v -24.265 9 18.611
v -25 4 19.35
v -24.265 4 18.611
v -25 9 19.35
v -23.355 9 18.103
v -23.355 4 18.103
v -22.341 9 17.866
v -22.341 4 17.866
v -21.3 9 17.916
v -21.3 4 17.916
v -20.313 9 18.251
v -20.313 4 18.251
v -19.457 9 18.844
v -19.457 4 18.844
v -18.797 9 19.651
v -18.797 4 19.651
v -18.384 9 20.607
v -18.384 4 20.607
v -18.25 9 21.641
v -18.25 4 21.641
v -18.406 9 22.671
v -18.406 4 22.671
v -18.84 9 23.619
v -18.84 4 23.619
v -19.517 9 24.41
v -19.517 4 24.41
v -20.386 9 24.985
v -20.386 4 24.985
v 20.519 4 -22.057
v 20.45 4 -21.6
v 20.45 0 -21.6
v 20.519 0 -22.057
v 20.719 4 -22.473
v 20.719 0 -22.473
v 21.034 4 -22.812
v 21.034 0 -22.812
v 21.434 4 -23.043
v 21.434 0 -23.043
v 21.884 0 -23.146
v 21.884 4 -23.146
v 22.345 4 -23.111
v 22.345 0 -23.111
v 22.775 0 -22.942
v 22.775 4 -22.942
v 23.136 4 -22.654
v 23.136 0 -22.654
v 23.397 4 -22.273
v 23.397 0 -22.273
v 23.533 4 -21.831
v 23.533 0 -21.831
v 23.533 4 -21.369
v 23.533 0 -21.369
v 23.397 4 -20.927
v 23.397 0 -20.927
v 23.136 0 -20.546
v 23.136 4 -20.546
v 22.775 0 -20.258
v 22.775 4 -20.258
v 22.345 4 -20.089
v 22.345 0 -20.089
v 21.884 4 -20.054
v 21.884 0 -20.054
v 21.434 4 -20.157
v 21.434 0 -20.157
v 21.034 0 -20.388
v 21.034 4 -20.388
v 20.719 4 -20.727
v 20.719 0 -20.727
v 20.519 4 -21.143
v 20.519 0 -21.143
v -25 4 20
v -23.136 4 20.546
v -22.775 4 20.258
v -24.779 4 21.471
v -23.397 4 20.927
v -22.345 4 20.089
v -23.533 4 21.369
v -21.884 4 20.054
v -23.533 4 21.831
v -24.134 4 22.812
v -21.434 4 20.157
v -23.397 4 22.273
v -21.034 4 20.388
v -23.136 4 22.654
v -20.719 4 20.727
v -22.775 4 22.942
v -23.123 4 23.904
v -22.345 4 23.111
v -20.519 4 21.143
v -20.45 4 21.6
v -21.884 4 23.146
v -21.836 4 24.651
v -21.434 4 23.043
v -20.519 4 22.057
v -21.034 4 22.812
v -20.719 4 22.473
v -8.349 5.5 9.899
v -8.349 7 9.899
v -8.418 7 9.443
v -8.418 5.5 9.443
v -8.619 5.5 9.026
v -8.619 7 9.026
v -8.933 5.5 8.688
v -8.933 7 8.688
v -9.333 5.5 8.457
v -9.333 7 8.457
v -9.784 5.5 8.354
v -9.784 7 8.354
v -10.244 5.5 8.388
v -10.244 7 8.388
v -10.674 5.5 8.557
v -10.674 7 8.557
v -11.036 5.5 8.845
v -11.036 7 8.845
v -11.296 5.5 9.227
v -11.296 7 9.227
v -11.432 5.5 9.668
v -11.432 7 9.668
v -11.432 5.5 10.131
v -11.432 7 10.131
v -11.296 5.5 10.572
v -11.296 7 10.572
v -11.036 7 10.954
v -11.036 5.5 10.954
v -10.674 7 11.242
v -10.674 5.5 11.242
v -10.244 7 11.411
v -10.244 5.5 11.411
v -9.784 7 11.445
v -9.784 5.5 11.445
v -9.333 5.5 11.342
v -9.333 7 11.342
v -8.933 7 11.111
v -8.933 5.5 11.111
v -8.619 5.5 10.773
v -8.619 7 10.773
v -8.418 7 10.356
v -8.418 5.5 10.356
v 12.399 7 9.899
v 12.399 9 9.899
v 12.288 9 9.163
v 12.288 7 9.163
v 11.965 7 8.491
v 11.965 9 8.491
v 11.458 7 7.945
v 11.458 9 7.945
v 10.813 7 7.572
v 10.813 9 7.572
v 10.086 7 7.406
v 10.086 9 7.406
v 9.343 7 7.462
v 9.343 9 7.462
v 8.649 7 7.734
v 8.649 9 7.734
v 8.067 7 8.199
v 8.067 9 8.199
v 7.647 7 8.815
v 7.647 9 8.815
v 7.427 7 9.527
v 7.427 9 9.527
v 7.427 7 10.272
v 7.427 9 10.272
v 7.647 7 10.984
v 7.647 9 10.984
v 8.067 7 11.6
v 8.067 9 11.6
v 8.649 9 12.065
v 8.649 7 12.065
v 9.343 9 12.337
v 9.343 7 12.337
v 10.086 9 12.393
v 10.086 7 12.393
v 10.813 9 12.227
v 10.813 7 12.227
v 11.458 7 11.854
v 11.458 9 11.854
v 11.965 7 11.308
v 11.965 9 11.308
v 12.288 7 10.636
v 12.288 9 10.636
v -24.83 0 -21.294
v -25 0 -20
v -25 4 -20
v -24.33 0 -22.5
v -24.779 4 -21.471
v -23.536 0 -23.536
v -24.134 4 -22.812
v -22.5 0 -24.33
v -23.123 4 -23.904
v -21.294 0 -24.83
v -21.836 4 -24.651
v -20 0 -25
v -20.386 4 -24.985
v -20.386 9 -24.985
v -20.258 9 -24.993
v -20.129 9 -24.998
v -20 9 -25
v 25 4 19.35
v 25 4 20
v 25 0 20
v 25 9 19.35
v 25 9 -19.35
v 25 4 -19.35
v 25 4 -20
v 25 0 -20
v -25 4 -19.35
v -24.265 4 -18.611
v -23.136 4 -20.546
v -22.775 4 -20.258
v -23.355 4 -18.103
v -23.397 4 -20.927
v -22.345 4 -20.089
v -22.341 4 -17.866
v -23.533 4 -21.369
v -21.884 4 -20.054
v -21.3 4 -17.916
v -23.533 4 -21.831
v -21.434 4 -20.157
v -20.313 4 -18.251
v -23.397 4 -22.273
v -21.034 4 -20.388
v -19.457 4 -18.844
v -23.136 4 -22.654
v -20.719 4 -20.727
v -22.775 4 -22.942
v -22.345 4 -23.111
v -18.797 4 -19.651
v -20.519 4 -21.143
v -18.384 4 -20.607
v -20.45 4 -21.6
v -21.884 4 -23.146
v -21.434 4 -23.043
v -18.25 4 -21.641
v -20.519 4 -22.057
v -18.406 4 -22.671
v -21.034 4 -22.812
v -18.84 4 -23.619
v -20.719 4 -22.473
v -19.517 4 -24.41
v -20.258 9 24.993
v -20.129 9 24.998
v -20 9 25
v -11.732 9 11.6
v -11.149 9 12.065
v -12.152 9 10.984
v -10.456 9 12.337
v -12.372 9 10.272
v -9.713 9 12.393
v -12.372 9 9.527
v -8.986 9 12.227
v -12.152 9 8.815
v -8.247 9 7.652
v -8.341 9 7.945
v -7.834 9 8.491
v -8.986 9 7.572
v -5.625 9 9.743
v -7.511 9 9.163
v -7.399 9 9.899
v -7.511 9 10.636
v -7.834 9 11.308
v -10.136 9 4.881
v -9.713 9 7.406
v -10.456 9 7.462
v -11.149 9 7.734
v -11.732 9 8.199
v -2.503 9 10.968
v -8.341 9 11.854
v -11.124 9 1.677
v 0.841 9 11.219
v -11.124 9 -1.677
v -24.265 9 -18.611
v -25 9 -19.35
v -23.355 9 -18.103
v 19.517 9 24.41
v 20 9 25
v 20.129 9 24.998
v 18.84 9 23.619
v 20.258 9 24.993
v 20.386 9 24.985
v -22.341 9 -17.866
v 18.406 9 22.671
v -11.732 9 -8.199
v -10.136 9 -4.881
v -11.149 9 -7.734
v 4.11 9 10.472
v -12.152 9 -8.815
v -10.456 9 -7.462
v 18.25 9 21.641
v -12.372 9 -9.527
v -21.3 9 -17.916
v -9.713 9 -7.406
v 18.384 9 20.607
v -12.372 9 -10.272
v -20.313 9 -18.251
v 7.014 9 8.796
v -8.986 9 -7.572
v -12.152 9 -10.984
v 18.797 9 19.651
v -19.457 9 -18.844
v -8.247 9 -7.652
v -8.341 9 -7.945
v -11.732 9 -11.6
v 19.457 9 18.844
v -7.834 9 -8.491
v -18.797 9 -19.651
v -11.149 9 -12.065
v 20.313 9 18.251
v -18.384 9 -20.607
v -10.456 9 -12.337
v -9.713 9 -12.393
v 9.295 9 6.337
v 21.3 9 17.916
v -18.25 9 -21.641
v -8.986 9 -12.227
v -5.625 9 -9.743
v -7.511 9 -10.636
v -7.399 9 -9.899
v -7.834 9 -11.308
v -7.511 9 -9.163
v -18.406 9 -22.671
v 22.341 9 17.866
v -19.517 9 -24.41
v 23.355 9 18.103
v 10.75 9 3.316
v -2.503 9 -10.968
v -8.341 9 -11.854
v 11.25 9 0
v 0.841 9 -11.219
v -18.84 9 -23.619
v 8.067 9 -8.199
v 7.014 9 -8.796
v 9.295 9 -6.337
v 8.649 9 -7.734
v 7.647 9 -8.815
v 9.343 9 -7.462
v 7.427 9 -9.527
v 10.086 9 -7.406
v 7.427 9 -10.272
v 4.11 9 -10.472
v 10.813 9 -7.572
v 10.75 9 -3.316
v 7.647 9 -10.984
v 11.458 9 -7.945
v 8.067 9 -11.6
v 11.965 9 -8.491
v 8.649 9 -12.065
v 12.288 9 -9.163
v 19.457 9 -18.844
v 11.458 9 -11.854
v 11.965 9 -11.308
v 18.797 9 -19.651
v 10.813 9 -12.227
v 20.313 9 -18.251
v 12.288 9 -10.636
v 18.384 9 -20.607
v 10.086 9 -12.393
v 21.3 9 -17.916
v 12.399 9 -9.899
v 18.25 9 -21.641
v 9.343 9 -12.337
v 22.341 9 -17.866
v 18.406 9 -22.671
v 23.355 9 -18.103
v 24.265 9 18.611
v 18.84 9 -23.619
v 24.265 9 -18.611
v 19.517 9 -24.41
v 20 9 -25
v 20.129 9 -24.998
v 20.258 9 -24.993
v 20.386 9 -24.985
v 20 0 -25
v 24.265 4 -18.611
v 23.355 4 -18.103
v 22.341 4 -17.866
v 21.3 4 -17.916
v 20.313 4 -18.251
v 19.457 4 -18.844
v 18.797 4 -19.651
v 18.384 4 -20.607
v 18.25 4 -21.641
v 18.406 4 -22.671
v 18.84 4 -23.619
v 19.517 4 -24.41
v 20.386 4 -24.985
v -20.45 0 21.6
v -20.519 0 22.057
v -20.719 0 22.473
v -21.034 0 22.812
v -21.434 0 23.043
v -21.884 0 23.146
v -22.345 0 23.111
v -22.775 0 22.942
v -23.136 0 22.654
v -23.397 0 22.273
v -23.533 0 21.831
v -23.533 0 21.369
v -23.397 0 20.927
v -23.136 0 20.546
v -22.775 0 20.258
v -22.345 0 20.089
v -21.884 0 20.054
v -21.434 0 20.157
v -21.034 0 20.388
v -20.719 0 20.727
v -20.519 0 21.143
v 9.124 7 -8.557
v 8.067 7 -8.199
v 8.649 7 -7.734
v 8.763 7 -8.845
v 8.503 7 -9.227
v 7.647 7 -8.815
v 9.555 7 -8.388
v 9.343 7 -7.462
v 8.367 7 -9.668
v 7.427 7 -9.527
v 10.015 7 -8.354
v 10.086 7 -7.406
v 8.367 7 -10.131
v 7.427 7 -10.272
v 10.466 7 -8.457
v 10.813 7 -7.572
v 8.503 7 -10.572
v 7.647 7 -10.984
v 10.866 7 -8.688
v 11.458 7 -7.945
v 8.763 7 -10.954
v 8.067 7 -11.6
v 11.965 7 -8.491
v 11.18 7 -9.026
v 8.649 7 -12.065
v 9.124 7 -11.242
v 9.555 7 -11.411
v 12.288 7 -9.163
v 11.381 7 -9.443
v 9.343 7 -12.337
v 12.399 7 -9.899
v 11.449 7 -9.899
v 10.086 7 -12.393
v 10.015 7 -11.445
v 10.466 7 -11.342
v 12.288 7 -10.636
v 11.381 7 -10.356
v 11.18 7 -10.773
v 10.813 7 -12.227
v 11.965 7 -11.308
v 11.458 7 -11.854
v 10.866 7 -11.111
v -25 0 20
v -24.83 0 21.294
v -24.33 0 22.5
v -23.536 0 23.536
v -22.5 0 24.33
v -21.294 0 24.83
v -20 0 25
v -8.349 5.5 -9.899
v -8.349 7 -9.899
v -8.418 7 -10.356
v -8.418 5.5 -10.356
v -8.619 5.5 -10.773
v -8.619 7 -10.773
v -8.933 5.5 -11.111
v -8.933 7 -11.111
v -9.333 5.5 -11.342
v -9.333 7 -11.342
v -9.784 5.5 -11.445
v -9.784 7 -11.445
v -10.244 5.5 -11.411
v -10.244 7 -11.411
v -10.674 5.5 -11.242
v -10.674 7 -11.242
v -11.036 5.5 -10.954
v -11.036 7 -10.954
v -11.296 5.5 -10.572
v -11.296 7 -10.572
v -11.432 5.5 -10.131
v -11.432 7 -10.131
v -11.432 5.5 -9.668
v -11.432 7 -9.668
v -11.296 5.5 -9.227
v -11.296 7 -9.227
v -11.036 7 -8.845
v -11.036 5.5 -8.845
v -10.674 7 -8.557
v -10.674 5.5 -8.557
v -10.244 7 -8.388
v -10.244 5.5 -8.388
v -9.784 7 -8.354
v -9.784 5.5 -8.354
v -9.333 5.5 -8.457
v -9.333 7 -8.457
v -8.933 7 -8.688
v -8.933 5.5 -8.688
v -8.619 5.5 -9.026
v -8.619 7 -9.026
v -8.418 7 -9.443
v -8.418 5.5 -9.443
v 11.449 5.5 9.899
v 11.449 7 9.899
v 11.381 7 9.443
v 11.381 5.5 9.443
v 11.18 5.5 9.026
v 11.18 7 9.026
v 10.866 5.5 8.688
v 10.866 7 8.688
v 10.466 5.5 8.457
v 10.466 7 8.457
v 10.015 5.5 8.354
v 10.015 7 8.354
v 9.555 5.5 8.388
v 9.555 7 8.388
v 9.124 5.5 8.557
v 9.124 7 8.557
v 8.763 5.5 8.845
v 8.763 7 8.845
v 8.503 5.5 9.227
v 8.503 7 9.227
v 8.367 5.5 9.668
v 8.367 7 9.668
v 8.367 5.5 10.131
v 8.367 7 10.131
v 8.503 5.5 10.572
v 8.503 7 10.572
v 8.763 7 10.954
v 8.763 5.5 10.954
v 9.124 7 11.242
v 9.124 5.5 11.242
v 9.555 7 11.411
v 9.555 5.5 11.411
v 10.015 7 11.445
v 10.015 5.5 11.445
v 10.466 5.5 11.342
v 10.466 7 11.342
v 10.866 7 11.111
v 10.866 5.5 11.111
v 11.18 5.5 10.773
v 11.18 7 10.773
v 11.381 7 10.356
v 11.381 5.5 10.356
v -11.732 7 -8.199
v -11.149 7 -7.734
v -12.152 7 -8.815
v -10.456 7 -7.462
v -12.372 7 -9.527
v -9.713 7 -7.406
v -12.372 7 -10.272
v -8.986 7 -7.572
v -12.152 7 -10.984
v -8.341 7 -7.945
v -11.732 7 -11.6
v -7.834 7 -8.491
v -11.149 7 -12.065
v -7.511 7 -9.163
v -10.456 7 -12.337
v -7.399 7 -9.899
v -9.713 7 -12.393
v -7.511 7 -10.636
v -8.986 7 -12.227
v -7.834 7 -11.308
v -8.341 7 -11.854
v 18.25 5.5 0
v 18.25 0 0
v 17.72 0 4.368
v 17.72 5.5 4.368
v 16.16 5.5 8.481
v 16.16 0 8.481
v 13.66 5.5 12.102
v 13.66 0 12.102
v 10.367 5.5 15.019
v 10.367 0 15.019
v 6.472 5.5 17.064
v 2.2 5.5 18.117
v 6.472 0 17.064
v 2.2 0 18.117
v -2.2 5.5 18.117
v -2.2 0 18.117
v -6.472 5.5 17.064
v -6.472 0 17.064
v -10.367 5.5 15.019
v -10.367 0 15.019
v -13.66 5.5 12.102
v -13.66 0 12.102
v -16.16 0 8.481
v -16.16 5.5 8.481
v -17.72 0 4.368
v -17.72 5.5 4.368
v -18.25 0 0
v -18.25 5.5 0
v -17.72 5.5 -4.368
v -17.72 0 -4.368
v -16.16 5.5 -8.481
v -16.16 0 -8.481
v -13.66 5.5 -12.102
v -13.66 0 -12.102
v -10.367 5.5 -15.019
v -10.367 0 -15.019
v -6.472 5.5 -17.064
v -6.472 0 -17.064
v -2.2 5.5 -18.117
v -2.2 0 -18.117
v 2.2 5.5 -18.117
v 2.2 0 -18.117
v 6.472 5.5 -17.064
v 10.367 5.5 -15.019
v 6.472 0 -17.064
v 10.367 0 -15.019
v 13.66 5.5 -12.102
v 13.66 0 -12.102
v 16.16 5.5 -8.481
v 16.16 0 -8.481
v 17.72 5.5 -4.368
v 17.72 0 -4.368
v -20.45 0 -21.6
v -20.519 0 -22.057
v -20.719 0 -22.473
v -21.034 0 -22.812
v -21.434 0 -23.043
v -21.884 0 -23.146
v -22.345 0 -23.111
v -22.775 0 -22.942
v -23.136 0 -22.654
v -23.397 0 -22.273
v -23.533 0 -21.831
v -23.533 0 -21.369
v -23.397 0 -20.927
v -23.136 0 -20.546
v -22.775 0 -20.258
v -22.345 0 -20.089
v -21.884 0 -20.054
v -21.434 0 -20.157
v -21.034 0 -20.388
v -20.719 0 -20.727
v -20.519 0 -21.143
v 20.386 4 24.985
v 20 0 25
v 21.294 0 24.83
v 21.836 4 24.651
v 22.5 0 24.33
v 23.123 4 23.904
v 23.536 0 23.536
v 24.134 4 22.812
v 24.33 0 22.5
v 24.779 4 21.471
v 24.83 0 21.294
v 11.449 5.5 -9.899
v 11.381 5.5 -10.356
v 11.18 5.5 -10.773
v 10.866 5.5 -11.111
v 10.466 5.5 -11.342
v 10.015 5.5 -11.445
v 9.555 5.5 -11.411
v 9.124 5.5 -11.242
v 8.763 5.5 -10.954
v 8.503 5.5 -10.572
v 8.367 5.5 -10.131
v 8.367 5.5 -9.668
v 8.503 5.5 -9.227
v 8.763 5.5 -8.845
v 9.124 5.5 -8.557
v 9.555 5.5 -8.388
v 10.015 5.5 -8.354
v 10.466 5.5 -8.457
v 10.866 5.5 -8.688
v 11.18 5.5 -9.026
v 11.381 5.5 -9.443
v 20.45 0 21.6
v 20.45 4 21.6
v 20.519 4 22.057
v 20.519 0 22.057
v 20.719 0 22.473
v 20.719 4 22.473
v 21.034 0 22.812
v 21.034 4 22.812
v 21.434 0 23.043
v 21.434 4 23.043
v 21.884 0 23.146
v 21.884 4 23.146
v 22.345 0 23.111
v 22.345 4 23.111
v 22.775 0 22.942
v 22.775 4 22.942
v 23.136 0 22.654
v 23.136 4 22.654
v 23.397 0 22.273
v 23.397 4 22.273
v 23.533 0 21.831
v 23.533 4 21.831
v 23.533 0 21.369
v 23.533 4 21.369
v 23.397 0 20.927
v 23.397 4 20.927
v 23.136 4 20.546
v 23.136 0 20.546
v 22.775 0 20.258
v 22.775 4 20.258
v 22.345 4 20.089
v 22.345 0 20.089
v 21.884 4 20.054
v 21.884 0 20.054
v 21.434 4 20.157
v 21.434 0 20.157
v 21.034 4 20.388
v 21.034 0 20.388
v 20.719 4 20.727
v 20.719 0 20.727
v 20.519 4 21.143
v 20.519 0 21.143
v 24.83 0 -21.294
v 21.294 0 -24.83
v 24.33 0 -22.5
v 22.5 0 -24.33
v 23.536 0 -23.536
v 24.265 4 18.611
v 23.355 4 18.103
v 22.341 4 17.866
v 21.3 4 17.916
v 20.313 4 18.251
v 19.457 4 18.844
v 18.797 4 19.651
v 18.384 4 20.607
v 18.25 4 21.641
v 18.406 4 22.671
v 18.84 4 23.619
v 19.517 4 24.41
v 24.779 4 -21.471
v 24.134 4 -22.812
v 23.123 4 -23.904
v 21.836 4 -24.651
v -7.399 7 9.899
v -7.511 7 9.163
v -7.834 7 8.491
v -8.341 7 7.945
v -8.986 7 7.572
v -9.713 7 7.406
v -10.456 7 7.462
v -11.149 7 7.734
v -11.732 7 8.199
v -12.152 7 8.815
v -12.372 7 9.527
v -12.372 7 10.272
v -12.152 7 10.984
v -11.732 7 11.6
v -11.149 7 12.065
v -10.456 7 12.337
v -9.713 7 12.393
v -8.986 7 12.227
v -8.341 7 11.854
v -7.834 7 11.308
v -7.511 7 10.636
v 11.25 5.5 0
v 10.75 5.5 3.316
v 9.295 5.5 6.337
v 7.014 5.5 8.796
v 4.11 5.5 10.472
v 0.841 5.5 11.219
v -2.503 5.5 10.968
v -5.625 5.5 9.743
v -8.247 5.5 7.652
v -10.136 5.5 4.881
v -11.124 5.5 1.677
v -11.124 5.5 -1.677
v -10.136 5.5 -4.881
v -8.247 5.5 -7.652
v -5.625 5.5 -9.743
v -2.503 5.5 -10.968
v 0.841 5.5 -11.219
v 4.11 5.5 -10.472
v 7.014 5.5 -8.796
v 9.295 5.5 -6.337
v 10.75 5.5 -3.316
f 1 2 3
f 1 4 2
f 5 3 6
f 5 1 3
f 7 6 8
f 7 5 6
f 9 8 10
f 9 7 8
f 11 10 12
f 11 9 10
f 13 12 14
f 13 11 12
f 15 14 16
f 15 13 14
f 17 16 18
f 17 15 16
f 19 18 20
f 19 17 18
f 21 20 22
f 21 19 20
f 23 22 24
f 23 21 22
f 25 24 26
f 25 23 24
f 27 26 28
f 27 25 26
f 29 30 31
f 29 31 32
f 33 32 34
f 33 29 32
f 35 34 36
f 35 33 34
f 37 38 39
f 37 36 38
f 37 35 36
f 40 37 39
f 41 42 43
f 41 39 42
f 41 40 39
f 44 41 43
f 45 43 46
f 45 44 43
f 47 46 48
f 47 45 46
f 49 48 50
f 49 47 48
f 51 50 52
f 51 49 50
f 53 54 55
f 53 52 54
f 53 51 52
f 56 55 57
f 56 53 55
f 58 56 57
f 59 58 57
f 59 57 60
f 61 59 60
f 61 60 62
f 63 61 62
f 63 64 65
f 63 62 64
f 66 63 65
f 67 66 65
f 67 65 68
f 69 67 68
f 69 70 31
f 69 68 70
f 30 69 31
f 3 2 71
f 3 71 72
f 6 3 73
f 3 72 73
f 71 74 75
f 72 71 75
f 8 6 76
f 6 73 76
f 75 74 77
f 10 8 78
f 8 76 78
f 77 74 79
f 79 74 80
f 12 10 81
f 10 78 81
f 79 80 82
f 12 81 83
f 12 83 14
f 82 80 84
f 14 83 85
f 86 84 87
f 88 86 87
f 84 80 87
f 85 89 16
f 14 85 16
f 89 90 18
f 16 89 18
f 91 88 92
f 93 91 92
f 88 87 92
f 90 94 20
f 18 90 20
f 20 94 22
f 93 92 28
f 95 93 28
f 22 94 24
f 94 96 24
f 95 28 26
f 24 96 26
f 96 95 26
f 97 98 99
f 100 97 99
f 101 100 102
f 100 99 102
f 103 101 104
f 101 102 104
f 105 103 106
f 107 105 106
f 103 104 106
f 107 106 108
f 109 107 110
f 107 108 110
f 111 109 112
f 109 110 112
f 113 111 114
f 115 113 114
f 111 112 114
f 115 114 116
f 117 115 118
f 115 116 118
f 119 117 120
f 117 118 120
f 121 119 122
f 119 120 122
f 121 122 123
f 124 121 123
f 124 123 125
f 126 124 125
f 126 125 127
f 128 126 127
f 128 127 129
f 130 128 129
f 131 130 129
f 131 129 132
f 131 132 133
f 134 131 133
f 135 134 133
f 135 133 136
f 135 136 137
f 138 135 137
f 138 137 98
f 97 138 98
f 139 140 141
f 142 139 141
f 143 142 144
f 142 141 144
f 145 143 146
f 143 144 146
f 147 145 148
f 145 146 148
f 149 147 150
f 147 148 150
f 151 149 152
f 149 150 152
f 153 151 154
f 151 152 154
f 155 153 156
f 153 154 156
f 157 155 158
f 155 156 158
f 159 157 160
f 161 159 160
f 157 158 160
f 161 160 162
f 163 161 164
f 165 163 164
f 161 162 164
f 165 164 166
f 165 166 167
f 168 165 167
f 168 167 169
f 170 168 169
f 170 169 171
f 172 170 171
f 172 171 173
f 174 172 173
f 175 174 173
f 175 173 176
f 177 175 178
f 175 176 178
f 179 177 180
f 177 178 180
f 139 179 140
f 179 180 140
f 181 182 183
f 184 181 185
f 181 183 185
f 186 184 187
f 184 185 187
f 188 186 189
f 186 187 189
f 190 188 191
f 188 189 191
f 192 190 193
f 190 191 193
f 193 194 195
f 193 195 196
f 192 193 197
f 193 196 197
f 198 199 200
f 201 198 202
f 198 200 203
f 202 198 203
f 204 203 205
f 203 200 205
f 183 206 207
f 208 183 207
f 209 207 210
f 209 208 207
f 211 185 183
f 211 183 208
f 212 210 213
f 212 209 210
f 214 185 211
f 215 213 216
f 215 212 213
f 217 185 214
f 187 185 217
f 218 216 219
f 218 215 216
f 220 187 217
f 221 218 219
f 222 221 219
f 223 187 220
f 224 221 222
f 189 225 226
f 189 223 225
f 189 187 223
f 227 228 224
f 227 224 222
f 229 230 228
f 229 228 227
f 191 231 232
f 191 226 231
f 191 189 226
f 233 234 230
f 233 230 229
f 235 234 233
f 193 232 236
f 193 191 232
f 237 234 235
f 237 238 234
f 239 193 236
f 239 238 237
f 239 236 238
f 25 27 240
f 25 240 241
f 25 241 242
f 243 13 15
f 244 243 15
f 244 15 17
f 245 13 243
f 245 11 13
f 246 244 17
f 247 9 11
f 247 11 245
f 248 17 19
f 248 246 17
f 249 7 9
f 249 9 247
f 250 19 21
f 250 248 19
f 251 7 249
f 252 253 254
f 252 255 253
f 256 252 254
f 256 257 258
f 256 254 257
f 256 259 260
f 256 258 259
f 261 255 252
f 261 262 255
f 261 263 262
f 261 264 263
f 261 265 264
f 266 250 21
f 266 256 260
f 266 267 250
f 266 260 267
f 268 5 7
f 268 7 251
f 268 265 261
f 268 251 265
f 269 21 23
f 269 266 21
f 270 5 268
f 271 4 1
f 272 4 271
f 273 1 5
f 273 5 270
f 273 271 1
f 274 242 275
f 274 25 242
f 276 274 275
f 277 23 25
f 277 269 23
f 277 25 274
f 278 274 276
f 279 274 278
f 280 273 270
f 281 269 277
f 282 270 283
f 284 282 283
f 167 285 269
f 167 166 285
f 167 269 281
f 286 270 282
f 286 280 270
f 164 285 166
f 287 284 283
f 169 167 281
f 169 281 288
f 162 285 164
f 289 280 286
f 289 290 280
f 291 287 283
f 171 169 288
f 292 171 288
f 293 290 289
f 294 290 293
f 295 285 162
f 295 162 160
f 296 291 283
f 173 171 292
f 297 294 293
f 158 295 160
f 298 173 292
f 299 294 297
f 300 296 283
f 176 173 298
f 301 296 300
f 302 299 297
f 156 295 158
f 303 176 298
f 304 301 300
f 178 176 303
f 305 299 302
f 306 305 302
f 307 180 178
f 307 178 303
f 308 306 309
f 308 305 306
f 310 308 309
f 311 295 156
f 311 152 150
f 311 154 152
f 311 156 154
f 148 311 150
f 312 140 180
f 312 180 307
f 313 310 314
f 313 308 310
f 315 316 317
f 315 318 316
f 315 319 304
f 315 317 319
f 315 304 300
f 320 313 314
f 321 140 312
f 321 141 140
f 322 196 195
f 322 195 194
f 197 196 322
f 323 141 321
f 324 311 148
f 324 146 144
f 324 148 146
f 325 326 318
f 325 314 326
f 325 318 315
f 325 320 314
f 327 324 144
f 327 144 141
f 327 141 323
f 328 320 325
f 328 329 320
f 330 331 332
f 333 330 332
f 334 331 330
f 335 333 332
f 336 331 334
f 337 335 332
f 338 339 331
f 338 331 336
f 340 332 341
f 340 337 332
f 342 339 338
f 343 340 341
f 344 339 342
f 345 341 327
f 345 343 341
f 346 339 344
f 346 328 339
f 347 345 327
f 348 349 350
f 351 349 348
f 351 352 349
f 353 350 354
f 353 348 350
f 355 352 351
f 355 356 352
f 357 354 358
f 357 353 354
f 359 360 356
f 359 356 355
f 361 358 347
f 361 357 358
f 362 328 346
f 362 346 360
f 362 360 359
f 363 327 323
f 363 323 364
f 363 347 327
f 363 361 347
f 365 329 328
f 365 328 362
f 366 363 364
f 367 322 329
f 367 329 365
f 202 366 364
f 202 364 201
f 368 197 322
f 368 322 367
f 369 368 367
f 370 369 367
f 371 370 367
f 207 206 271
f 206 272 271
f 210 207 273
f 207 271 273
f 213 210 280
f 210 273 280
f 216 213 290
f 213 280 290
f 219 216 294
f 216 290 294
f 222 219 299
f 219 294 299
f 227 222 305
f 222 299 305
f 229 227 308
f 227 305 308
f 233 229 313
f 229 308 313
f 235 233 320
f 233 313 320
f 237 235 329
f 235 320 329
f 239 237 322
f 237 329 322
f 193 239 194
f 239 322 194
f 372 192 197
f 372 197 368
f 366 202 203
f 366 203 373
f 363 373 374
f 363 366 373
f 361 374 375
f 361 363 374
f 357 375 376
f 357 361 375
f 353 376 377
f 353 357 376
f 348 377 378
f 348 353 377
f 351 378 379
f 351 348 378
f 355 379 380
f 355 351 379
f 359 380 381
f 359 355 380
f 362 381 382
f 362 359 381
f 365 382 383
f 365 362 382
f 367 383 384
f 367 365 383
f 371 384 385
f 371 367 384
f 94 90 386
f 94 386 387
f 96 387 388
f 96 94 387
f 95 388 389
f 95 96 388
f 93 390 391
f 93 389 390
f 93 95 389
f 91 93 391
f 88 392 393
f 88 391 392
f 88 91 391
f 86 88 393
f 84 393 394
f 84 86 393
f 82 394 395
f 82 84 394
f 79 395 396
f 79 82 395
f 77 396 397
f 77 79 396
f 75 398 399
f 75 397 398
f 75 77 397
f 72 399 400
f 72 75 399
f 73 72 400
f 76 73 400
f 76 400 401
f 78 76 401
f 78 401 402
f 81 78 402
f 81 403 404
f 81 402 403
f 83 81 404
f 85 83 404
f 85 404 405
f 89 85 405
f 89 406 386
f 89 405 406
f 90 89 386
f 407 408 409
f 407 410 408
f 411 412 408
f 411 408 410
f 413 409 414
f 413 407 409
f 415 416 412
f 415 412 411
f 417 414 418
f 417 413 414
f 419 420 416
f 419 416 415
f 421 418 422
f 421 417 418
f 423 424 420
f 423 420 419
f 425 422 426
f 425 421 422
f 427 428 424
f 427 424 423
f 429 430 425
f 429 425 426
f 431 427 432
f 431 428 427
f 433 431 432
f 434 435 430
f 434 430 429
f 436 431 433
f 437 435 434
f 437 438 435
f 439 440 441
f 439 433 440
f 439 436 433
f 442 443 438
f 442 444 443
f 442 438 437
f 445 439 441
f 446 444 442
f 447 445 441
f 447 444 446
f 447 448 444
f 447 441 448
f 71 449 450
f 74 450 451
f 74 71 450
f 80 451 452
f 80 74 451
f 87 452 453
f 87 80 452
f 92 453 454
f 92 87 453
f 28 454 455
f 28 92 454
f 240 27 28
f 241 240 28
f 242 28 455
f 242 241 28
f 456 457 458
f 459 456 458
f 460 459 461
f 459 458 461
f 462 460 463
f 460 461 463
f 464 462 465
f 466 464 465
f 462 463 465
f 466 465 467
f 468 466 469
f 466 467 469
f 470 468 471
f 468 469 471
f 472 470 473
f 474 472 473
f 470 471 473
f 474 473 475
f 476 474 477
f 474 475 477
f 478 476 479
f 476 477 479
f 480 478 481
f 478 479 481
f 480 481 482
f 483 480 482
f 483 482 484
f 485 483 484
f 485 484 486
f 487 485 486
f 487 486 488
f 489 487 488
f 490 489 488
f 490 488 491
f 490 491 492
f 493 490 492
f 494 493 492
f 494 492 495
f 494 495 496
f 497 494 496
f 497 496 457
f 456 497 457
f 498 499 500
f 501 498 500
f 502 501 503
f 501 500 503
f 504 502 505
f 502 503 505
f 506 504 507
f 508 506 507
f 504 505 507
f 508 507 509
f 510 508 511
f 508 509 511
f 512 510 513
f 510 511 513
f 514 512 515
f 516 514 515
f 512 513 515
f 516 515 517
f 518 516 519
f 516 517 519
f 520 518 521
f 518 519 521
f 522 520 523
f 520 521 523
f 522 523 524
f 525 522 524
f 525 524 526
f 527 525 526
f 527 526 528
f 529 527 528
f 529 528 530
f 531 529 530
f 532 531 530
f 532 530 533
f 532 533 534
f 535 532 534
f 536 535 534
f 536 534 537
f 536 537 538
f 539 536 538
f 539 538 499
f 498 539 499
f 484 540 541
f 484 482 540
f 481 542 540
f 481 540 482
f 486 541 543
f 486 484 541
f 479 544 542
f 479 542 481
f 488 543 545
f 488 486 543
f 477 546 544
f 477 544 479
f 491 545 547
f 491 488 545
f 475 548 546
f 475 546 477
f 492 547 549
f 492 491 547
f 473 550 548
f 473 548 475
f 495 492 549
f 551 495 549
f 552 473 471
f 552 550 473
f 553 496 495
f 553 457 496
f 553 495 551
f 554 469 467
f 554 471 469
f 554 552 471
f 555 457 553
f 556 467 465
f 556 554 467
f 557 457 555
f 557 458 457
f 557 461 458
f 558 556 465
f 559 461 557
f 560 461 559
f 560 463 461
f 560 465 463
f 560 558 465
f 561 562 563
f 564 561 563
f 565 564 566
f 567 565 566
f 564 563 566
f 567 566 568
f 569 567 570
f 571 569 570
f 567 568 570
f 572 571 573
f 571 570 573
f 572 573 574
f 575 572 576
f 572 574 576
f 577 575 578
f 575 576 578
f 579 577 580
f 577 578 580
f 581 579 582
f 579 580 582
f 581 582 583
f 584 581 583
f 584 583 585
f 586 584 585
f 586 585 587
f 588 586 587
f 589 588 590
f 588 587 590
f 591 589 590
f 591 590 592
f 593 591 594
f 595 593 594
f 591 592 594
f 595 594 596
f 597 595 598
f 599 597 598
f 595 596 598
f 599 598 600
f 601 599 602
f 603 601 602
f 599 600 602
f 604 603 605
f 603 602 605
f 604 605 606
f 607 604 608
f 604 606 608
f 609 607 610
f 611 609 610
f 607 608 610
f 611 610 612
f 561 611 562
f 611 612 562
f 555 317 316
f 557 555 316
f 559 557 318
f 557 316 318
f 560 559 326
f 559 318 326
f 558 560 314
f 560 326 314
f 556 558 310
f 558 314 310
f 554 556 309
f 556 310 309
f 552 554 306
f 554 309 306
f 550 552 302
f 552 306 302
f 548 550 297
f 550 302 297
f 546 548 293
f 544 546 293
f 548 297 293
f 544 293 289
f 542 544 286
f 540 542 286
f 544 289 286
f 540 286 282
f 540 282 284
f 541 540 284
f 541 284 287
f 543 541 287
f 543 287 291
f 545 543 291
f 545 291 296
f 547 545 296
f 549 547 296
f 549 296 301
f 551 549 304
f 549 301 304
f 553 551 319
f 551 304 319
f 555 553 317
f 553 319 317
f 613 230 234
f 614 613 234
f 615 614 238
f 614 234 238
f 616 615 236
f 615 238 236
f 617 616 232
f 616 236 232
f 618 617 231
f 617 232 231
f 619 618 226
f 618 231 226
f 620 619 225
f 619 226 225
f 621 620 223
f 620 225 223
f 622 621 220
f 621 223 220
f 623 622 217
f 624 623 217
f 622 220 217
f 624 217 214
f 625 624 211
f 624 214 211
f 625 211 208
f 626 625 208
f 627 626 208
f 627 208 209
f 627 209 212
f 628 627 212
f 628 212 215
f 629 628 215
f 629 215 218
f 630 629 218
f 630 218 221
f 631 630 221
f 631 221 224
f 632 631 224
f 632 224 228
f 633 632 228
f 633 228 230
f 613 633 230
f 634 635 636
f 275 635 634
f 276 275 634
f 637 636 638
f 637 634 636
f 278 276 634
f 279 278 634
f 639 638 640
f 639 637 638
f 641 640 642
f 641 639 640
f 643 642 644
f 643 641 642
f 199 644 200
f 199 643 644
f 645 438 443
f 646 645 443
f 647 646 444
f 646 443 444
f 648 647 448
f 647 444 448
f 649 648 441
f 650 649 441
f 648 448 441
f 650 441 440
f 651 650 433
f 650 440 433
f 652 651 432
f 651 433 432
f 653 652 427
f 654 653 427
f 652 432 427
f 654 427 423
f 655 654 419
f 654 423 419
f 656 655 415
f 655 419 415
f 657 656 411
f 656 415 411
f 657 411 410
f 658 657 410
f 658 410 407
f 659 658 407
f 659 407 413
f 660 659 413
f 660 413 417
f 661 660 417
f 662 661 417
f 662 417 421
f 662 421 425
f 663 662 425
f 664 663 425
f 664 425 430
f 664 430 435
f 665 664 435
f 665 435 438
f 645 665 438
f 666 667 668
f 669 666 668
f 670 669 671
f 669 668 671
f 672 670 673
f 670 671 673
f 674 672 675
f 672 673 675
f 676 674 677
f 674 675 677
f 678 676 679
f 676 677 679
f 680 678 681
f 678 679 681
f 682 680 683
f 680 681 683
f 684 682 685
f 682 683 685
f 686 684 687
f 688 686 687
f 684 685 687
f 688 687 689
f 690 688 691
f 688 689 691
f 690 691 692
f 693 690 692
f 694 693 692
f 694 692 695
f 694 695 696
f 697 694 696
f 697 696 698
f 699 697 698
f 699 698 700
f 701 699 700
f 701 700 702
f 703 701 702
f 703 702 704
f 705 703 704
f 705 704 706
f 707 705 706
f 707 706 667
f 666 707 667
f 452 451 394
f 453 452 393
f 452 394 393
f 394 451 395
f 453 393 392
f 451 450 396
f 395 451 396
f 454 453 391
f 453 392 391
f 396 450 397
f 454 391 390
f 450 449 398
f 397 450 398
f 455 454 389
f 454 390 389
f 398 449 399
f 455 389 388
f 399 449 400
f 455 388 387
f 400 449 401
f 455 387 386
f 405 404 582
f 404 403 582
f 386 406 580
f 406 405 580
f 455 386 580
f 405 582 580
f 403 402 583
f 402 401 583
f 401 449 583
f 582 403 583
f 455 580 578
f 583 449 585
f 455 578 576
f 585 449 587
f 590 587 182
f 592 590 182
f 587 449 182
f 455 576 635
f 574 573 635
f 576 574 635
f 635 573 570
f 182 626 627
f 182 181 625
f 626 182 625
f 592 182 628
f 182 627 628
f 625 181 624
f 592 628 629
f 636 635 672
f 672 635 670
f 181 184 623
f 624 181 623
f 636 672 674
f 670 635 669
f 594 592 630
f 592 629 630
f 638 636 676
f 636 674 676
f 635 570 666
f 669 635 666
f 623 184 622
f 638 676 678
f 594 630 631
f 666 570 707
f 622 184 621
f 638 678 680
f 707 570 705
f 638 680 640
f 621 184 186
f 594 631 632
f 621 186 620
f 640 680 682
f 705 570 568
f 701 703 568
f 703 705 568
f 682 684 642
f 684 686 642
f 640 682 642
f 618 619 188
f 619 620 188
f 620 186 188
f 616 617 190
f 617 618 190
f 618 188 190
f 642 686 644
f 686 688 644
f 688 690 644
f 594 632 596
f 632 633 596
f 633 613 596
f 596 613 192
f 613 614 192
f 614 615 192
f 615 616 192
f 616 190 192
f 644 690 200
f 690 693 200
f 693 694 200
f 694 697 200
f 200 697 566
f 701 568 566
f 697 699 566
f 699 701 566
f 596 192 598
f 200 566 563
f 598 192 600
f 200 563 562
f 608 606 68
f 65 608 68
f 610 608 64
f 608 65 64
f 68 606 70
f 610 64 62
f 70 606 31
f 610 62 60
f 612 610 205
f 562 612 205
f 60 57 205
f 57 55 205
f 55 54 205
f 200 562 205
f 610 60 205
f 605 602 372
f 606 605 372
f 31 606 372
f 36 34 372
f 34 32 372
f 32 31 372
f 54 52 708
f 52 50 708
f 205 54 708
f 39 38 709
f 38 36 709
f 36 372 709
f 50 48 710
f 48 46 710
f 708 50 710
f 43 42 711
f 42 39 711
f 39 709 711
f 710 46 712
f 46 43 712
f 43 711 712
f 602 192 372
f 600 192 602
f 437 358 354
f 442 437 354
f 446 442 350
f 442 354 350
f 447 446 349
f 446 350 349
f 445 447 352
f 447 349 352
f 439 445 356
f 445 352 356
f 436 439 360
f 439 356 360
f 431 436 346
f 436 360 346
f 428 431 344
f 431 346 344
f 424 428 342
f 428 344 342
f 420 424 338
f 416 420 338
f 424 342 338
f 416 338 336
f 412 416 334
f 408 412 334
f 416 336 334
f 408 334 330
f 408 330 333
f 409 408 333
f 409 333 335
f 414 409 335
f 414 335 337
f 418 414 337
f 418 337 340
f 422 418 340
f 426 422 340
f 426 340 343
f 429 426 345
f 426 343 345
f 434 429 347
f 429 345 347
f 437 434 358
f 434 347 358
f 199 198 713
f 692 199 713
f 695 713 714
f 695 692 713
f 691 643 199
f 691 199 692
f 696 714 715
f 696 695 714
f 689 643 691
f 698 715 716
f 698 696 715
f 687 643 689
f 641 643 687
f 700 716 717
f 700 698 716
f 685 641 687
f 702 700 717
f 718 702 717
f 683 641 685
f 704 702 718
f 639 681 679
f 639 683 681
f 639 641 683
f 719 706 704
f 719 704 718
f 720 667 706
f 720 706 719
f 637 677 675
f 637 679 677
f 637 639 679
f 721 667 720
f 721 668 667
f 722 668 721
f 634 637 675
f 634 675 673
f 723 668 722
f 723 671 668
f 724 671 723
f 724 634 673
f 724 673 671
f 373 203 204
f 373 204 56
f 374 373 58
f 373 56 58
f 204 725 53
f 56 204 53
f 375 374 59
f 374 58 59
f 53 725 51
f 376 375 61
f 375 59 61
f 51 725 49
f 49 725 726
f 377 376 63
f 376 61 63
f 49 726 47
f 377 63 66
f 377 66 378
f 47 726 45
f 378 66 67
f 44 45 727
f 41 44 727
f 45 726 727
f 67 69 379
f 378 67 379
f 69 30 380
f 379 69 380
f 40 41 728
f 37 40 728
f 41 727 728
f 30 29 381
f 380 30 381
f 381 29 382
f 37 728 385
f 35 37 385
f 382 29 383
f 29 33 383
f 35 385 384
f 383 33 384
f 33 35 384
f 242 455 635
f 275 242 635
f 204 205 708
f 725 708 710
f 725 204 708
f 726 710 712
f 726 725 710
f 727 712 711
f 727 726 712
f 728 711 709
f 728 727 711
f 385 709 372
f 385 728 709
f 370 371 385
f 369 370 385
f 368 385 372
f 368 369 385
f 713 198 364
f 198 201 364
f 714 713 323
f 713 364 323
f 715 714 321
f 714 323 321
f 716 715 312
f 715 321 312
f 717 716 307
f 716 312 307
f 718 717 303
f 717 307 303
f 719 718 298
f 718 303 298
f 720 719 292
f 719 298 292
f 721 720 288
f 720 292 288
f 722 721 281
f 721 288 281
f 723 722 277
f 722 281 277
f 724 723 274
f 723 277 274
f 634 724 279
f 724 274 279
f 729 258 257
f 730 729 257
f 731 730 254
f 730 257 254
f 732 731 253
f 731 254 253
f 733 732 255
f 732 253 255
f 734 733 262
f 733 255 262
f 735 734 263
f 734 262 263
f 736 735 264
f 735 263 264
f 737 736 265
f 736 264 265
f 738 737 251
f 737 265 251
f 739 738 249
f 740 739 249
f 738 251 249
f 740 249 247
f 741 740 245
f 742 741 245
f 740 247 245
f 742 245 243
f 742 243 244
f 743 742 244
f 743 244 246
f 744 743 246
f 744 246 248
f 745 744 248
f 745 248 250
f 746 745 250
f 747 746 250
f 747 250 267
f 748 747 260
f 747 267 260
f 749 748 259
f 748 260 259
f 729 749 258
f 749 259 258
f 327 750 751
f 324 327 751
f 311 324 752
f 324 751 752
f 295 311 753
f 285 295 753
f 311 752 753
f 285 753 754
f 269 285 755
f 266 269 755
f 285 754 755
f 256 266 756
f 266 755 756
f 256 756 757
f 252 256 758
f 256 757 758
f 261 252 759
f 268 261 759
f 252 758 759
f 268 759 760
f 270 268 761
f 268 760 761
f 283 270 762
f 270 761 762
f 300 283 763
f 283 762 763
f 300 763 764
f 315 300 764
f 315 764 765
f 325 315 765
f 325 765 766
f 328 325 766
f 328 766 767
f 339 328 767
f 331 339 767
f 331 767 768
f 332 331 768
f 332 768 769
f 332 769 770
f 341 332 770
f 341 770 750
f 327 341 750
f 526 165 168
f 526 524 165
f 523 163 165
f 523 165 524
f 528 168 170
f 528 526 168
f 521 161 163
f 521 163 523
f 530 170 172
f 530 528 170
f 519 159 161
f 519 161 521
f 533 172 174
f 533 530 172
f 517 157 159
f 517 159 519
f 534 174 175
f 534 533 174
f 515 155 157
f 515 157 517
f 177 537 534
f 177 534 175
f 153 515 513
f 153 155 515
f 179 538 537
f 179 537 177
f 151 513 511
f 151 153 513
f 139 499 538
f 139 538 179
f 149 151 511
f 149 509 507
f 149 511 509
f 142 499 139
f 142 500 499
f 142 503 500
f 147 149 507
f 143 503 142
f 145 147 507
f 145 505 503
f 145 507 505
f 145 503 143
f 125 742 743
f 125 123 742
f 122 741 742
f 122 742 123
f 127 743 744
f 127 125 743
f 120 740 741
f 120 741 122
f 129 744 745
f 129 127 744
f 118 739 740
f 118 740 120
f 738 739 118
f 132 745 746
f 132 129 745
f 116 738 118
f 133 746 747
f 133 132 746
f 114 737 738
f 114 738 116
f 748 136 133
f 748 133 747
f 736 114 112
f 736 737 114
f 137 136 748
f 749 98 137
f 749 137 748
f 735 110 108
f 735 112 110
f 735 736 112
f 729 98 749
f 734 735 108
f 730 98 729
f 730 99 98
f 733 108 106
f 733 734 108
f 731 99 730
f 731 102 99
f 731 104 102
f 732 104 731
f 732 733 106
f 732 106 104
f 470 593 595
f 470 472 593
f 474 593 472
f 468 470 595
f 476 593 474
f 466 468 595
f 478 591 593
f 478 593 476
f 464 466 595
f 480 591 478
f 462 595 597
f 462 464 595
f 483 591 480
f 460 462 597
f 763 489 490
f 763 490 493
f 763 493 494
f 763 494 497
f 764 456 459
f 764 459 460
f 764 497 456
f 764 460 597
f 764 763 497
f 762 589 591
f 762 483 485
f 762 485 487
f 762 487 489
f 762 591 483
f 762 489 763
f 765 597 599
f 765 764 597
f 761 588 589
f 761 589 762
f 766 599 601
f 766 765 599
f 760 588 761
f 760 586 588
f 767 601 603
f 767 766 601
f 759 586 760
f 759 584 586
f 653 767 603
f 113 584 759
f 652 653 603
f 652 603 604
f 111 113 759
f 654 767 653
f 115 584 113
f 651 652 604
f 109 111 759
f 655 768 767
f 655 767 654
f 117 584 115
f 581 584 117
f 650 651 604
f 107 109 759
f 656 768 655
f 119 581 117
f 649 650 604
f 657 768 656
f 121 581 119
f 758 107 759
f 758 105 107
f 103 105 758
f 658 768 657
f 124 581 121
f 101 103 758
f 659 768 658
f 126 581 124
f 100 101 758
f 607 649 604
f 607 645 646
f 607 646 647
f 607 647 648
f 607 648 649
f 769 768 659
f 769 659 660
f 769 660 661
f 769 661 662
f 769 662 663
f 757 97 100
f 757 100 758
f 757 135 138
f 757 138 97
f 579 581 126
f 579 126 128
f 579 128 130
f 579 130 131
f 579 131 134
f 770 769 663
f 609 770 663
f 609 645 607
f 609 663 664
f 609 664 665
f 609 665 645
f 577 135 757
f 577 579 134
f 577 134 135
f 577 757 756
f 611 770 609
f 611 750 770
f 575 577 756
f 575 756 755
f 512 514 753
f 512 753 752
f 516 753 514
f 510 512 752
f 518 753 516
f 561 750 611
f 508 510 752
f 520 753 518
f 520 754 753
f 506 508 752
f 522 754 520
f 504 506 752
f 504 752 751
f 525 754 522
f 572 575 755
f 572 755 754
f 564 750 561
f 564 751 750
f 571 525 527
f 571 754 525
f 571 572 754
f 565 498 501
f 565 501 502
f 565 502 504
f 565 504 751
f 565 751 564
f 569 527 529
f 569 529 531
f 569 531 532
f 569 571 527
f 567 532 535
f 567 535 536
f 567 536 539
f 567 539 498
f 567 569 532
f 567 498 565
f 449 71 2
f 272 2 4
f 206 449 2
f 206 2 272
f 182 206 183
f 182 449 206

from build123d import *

# Parameters (mm, degrees)
SKETCH1_W               = 50
SKETCH1_H               = 50
BOSS_EXTRUDE1_DEPTH     = 12
FILLET1_R               = 5
SKETCH3_R               = 18.25
CUT_EXTRUDE1_DEPTH      = 5.5
SKETCH4_R               = 11.25
CUT_EXTRUDE2_DEPTH      = 10
SKETCH5_W               = 62.97921445
SKETCH5_H               = 70.453436458
CUT_EXTRUDE3_DEPTH      = 3
SKETCH6_R               = 2.5
CUT_EXTRUDE4_DEPTH      = 2
SKETCH7_R               = 1.55
CUT_EXTRUDE5_DEPTH      = 3
SKETCH8_R               = 1.55
CUT_EXTRUDE6_DEPTH      = 12
SKETCH9_R               = 3.75
CUT_EXTRUDE7_DEPTH      = 5
MIRROR2_COPY_1_SKETCH_R = 1.55
MIRROR2_COPY_1_DEPTH    = 12
MIRROR2_COPY_2_SKETCH_R = 3.75
MIRROR2_COPY_2_DEPTH    = 5


with BuildPart() as part:
    # Sketch1 → Boss-Extrude1 (new body)
    with BuildSketch(Plane(origin=(0, 0, 0), x_dir=(1, 0, 0), z_dir=(0, 1, 0))):
        Rectangle(SKETCH1_W, SKETCH1_H)
    extrude(amount=BOSS_EXTRUDE1_DEPTH)

    # Fillet1
    fillet1_edges = [part.edges().sort_by_distance(p)[0] for p in [
        (25, 6, 25),
        (-25, 6, 25),
        (-25, 6, -25),
        (25, 6, -25),
    ]]
    fillet(fillet1_edges, radius=FILLET1_R)

    # Sketch3 → Cut-Extrude1 (cut)
    with BuildSketch(Plane.XZ):
        Circle(SKETCH3_R)
    extrude(amount=-CUT_EXTRUDE1_DEPTH, mode=Mode.SUBTRACT)

    # Sketch4 → Cut-Extrude2 (cut)
    with BuildSketch(Plane.XZ.offset(-5.5)):
        Circle(SKETCH4_R)
    extrude(amount=-CUT_EXTRUDE2_DEPTH, mode=Mode.SUBTRACT)

    # Sketch5 → Cut-Extrude3 (cut)
    with BuildSketch(Plane(origin=(0, 12, 0), x_dir=(1, 0, 0), z_dir=(0, 1, 0))):
        Rectangle(SKETCH5_W, SKETCH5_H)
    extrude(amount=-CUT_EXTRUDE3_DEPTH, mode=Mode.SUBTRACT)

    # Sketch6 → Cut-Extrude4 (cut)
    with BuildSketch(Plane(origin=(0, 9, 0), x_dir=(1, 0, 0), z_dir=(0, 1, 0))):
        with Locations((-9.899494937, 9.899494937)):
            Circle(SKETCH6_R)
        with Locations((9.899494937, 9.899494937)):
            Circle(SKETCH6_R)
        with Locations((-9.899494937, -9.899494937)):
            Circle(SKETCH6_R)
        with Locations((9.899494937, -9.899494937)):
            Circle(SKETCH6_R)
    extrude(amount=-CUT_EXTRUDE4_DEPTH, mode=Mode.SUBTRACT)

    # Sketch7 → Cut-Extrude5 (cut)
    with BuildSketch(Plane(origin=(0, 7, 0), x_dir=(1, 0, 0), z_dir=(0, 1, 0))):
        with Locations((-9.899494937, 9.899494937)):
            Circle(SKETCH7_R)
        with Locations((9.899494937, 9.899494937)):
            Circle(SKETCH7_R)
        with Locations((-9.899494937, -9.899494937)):
            Circle(SKETCH7_R)
        with Locations((9.899494937, -9.899494937)):
            Circle(SKETCH7_R)
    extrude(amount=-CUT_EXTRUDE5_DEPTH, mode=Mode.SUBTRACT)

    # Sketch8 → Cut-Extrude6 (cut)
    with BuildSketch(Plane(origin=(0, 9, 0), x_dir=(1, 0, 0), z_dir=(0, 1, 0))):
        with Locations((-22, 21.6)):
            Circle(SKETCH8_R)
    cut_extrude6 = extrude(amount=-CUT_EXTRUDE6_DEPTH, mode=Mode.SUBTRACT)

    # Sketch9 → Cut-Extrude7 (cut)
    with BuildSketch(Plane(origin=(0, 9, 0), x_dir=(1, 0, 0), z_dir=(0, 1, 0))):
        with Locations((-22, 21.6)):
            Circle(SKETCH9_R)
    cut_extrude7 = extrude(amount=-CUT_EXTRUDE7_DEPTH, mode=Mode.SUBTRACT)

    # Mirror1: Cut-Extrude6, Cut-Extrude7 across plane
    add(cut_extrude6.mirror(Plane(origin=(0, 0, 0), x_dir=(0, 0, 1), z_dir=(1, 0, 0))), mode=Mode.SUBTRACT)
    add(cut_extrude7.mirror(Plane(origin=(0, 0, 0), x_dir=(0, 0, 1), z_dir=(1, 0, 0))), mode=Mode.SUBTRACT)

    # Mirror2: Cut-Extrude6, Cut-Extrude7 across plane
    add(cut_extrude6.mirror(Plane.XY), mode=Mode.SUBTRACT)
    add(cut_extrude7.mirror(Plane.XY), mode=Mode.SUBTRACT)

    # Mirror2 copy 1 sketch → Mirror2 copy 1 (cut)
    with BuildSketch(Plane(origin=(0, 9, 0), x_dir=(-1, 0, 0), z_dir=(0, 1, 0))):
        with Locations((-22, 21.6)):
            Circle(MIRROR2_COPY_1_SKETCH_R)
    extrude(amount=-MIRROR2_COPY_1_DEPTH, mode=Mode.SUBTRACT)

    # Mirror2 copy 2 sketch → Mirror2 copy 2 (cut)
    with BuildSketch(Plane(origin=(0, 9, 0), x_dir=(-1, 0, 0), z_dir=(0, 1, 0))):
        with Locations((-22, 21.6)):
            Circle(MIRROR2_COPY_2_SKETCH_R)
    extrude(amount=-MIRROR2_COPY_2_DEPTH, mode=Mode.SUBTRACT)


solid = part.part
